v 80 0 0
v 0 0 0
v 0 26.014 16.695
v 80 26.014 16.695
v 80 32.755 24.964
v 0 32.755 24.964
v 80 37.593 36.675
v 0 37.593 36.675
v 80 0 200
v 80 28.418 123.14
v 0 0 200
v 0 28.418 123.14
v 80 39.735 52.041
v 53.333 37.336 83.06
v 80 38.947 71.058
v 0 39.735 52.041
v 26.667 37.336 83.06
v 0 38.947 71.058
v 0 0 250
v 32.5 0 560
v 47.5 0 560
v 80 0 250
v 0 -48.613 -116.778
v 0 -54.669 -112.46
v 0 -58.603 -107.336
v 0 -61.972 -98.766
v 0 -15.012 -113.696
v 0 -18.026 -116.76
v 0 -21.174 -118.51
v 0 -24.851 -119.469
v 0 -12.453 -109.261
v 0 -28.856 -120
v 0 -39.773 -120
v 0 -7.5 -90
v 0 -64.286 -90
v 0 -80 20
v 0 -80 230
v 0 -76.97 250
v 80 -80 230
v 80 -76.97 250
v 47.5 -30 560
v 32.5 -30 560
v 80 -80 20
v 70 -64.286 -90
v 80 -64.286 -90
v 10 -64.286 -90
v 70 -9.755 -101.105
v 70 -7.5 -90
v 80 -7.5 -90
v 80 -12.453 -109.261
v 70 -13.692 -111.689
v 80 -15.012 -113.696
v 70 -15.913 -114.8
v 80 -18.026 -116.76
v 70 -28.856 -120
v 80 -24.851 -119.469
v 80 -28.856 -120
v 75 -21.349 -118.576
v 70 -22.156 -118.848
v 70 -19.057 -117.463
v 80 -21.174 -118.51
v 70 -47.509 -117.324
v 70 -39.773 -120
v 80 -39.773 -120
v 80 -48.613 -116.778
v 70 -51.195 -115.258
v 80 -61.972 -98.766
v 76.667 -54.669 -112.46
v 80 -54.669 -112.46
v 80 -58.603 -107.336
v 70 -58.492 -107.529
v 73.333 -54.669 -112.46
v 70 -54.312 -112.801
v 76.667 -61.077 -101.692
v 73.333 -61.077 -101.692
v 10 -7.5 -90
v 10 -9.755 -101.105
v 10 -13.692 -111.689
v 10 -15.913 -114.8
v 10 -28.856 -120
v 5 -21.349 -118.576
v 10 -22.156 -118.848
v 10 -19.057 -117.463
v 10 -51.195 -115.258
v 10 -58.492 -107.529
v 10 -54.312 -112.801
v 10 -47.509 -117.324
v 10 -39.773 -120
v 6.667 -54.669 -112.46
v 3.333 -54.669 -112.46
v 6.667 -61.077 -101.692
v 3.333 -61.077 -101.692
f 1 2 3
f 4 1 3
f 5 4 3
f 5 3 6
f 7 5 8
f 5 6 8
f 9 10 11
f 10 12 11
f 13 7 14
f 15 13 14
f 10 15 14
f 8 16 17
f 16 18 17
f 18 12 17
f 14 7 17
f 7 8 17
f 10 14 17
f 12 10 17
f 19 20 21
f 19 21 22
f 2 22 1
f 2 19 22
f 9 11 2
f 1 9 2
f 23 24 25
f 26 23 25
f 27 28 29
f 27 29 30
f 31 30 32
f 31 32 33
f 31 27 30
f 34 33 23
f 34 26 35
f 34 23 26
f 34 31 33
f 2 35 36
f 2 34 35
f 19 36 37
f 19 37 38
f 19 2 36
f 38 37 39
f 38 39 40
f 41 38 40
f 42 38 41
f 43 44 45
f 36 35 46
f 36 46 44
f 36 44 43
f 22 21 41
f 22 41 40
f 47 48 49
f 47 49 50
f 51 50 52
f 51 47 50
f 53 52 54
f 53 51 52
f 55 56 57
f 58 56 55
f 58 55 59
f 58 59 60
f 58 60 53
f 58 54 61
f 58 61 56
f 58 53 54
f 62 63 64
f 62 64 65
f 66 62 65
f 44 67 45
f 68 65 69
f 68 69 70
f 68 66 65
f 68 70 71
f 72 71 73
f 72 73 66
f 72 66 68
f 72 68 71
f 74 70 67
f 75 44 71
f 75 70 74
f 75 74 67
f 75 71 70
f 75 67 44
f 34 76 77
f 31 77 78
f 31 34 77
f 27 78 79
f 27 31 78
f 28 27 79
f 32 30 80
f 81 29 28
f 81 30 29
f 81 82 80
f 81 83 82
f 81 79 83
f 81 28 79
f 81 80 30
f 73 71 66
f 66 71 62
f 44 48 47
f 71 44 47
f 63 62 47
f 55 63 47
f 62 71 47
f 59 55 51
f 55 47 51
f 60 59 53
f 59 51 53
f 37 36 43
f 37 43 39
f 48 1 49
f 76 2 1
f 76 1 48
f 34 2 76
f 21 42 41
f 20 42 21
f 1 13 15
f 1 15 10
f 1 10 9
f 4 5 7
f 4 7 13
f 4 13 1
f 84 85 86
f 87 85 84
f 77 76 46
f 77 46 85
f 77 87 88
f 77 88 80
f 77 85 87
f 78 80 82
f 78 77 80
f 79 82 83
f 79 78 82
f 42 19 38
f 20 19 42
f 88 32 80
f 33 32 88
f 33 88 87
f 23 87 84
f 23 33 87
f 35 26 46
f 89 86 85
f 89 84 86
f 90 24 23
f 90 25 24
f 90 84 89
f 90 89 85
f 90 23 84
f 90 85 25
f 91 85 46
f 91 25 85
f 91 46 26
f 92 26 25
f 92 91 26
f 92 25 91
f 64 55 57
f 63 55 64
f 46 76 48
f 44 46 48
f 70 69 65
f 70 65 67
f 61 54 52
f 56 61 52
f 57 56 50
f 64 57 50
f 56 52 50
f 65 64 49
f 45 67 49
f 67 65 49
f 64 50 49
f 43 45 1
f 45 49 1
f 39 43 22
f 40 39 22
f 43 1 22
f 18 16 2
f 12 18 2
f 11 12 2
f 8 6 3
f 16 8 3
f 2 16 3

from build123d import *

# Parameters (mm, degrees)
EXTRUDE_1_DEPTH     = 80
CUT_EXTRUDE_1_DEPTH = 572.314274283
CUT_EXTRUDE_3_DEPTH = 80
SKETCH_4_W          = 60
SKETCH_4_H          = 53.972449548
CUT_EXTRUDE_4_DEPTH = 200
EXTRUDE_2_DEPTH     = 80


# Read off the part's stored shape, not the designer's step: 切除-拉伸3
with BuildPart() as part:
    # 草图1 → 拉伸1 (new body)
    with BuildSketch(Plane(origin=(0, 0, 0), x_dir=(0, 0, -1), z_dir=(1, 0, 0))):
        Polygon((0, 0), (120, -10), (120, -60), (-20, -80), (-230, -80), (-560, -30), (-560, 0), align=None)
    extrude(amount=EXTRUDE_1_DEPTH)

    # 草图2 → 切除-拉伸1 (cut, through all)
    with BuildSketch(Plane(origin=(0, 0, 0), x_dir=(1, 0, 0), z_dir=(0, 1, 0))):
        Polygon((-123.214670982, -250), (0, -250), (32.5, -560), (47.5, -560), (80, -250), (223.387270766, -250), (223.387270766, -944.244796541), (-123.214670982, -944.244796541), align=None)
    extrude(amount=-CUT_EXTRUDE_1_DEPTH, mode=Mode.SUBTRACT)

    # 切除-拉伸3 outline → 切除-拉伸3 (cut)
    with BuildSketch(Plane(origin=(0, 0, 0), x_dir=(0, 0, -1), z_dir=(1, 0, 0))):
        with BuildLine():
            Line((120, -10), (90, -7.5))
            add(Edge.make_bspline(
                [(90, -7.5), (102.569578594, -9.785522719), (118.163665106, -12.620990808), (119.701695558, -26.218981675), (120, -28.856342384)],
                knots=[0, 0, 0, 0, 0.806047766, 1, 1, 1, 1], degree=3))
            Line((120, -28.856342384), (120, -10))
        make_face()
        with BuildLine():
            Line((120, -60), (120, -39.772521617))
            add(Edge.make_bspline(
                [(120, -39.772521617), (114.843141559, -60.677011253), (101.385924703, -60.912360271), (90, -64.285714286)],
                knots=[0, 0, 0, 0, 1, 1, 1, 1], degree=3))
            Line((90, -64.285714286), (120, -60))
        make_face()
    extrude(amount=CUT_EXTRUDE_3_DEPTH, mode=Mode.SUBTRACT)

    # 草图4 → 切除-拉伸4 (cut)
    with BuildSketch(Plane(origin=(0, 0, 0), x_dir=(1, 0, 0), z_dir=(0, 1, 0))):
        with Locations((40, 116.986224774)):
            Rectangle(SKETCH_4_W, SKETCH_4_H)
    extrude(amount=-CUT_EXTRUDE_4_DEPTH, mode=Mode.SUBTRACT)


with BuildPart() as body_2:
    # 草图5 → 拉伸2 (new body)
    with BuildSketch(Plane(origin=(0, 0, 0), x_dir=(0, 0, -1), z_dir=(1, 0, 0))):
        with BuildLine():
            Line((-200, 0), (0, 0))
            add(Edge.make_bspline(
                [(0, 0), (-6.294299224, 11.901459338), (-22.767386249, 43.049291436), (-108.644216453, 38.00822116), (-163.451278249, 15.205954626), (-200, 0)],
                knots=[0, 0, 0, 0, 0.170815498, 0.447048744, 1, 1, 1, 1], degree=3))
        make_face()
    extrude(amount=EXTRUDE_2_DEPTH)


solid = Compound([part.part, body_2.part])
